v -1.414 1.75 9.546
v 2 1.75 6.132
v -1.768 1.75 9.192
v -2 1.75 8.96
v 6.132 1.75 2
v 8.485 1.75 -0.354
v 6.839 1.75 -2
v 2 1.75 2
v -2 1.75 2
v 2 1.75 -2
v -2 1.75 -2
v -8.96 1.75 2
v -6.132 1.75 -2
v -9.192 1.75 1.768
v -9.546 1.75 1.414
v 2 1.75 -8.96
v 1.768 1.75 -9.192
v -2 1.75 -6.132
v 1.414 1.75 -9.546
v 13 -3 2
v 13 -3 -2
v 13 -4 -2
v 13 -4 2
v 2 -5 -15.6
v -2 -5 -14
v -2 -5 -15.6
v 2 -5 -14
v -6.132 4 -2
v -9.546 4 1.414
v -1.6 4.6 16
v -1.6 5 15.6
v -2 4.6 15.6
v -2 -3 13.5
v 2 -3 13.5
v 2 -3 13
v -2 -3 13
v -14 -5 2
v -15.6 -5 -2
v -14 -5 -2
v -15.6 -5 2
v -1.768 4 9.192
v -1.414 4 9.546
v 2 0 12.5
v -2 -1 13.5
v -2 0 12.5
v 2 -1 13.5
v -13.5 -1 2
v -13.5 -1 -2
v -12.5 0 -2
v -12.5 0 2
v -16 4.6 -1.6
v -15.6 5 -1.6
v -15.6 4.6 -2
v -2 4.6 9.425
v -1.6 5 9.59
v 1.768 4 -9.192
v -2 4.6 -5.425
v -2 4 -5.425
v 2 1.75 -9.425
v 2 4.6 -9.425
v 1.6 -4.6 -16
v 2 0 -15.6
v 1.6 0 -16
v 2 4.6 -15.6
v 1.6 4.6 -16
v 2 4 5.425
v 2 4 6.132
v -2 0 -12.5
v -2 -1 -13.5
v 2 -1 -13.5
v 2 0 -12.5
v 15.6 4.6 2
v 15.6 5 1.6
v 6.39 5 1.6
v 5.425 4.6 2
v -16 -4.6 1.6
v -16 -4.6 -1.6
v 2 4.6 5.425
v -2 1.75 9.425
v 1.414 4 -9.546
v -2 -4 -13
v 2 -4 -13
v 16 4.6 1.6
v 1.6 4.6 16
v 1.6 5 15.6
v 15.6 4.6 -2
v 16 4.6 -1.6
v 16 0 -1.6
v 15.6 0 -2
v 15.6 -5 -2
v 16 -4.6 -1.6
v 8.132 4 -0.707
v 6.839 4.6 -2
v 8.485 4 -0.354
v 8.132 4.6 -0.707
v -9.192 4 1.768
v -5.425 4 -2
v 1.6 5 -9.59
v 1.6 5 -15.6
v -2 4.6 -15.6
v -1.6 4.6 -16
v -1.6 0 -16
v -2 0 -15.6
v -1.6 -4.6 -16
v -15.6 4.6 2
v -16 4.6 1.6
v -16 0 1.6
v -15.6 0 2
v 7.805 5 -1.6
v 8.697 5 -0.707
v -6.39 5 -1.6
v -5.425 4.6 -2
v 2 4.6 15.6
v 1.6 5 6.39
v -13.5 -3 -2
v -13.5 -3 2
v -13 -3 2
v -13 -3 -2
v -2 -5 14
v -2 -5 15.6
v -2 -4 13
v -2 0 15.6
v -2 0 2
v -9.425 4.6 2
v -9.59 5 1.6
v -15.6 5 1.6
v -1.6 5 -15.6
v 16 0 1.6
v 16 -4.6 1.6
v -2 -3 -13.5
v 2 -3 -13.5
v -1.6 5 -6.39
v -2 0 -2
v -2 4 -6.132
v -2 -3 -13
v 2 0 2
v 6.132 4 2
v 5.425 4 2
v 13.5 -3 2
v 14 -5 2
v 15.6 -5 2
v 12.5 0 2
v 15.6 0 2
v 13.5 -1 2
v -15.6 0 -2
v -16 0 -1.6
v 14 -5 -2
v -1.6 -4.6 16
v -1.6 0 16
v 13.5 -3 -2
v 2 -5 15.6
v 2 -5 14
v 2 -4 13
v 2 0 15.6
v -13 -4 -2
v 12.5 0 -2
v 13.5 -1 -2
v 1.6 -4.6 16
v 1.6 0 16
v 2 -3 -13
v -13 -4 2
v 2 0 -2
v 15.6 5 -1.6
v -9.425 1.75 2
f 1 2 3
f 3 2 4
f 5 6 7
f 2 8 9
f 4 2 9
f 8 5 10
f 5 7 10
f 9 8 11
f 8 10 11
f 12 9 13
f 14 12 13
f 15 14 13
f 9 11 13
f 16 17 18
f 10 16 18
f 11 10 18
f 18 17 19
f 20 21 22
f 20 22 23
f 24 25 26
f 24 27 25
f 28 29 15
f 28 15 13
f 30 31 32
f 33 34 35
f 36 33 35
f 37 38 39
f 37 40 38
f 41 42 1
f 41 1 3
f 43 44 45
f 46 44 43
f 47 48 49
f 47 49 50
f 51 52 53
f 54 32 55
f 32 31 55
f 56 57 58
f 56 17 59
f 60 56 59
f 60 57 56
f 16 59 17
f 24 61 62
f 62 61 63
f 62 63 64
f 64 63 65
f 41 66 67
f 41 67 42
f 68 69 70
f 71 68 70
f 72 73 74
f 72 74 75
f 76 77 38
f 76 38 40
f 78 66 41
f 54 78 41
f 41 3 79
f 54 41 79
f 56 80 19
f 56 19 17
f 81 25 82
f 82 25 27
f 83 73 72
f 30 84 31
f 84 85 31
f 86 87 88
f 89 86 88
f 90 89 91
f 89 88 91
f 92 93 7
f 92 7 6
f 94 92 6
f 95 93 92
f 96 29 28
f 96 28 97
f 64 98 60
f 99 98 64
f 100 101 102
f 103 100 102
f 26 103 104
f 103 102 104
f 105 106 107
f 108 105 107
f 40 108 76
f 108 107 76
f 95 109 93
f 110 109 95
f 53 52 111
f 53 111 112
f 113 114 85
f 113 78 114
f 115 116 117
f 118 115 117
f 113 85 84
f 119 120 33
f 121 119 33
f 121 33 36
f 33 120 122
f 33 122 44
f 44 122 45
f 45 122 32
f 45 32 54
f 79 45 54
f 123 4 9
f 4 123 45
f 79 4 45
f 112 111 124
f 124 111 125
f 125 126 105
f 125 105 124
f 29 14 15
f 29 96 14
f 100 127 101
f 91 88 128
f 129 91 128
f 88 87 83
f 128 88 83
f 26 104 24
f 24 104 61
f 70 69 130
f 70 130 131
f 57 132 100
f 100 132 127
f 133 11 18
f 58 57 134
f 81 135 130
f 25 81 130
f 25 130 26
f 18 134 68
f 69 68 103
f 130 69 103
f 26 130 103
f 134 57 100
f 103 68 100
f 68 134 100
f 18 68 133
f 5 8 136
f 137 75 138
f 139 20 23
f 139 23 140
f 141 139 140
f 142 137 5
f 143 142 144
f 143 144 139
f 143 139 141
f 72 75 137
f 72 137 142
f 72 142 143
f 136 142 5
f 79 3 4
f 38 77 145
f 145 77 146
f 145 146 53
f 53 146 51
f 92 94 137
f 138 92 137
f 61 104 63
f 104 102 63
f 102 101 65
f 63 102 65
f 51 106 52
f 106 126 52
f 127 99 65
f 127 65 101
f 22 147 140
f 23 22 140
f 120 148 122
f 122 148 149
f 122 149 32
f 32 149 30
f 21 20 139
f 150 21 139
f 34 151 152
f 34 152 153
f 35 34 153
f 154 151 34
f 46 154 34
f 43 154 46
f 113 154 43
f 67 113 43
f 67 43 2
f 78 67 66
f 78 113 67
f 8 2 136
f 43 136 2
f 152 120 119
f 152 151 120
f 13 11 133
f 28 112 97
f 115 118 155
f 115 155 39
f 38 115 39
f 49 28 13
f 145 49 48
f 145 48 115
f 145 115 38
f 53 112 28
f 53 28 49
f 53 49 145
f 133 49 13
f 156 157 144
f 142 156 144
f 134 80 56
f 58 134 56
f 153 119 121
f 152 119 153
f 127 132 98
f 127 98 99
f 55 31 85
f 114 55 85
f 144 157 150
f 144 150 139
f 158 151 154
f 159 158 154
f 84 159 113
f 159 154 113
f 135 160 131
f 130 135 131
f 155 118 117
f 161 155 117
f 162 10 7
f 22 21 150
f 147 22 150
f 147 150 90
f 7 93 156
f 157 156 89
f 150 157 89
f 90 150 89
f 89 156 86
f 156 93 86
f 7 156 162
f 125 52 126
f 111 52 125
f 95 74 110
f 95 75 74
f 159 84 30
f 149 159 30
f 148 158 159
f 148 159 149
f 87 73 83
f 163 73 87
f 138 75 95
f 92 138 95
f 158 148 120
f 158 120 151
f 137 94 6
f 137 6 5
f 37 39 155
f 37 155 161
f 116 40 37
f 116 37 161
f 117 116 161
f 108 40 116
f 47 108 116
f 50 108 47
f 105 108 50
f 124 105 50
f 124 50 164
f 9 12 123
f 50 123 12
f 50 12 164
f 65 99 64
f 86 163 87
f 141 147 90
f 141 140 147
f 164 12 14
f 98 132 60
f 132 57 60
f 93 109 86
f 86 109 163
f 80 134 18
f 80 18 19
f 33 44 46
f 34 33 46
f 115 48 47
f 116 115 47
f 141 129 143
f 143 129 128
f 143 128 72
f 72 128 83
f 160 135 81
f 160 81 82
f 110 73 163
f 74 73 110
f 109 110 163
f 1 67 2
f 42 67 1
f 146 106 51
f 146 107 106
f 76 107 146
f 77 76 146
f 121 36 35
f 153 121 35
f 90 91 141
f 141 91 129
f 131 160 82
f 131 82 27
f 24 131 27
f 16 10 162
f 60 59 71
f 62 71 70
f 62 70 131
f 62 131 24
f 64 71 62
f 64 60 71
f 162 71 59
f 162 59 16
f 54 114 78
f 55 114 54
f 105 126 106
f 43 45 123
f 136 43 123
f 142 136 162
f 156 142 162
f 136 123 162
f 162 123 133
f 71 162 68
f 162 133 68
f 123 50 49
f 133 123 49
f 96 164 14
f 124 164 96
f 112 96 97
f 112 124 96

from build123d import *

# Parameters (mm, degrees)
SKETCH1_W               = 31.999999976
SKETCH1_H               = 4
BOSS_EXTRUDE1_DEPTH     = 5
SKETCH2_W               = 2.499999921
SKETCH2_H               = 4
BOSS_EXTRUDE2_DEPTH     = 3
SKETCH3_W               = 2.999999921
SKETCH3_H               = 4
BOSS_EXTRUDE3_DEPTH     = 2
CIRPATTERN1_COUNT       = 2
CIRPATTERN1_ANGLE       = 90
CUT_EXTRUDE1_DEPTH      = 3.250000112
BOSS_EXTRUDE4_DEPTH     = 1
CUT_EXTRUDE_THIN1_START = -3.25
CUT_EXTRUDE_THIN1_DEPTH = 3.25
CUT_EXTRUDE_THIN2_START = -3.25
CUT_EXTRUDE_THIN2_DEPTH = 3.25
CHAMFER2_SIZE           = 1
CHAMFER3_SIZE           = 0.4


with BuildPart() as part:
    # Sketch1 → Boss-Extrude1 (new body)
    with BuildSketch(Plane(origin=(0, 0, 0), x_dir=(1, 0, 0), z_dir=(0, 1, 0))):
        Rectangle(SKETCH1_W, SKETCH1_H)
    extrude(amount=BOSS_EXTRUDE1_DEPTH)

    # Sketch2 → Boss-Extrude2 (add)
    with BuildSketch(Plane.XZ):
        with Locations((14.750000028, 0)):
            Rectangle(SKETCH2_W, SKETCH2_H)
        with Locations((-14.750000028, 0)):
            Rectangle(SKETCH2_W, SKETCH2_H)
    extrude(amount=BOSS_EXTRUDE2_DEPTH)

    # Sketch3 → Boss-Extrude3 (add)
    with BuildSketch(Plane.XZ.offset(3)):
        with Locations((14.500000028, 0)):
            Rectangle(SKETCH3_W, SKETCH3_H)
        with Locations((-14.500000028, 0)):
            Rectangle(SKETCH3_W, SKETCH3_H)
    extrude(amount=BOSS_EXTRUDE3_DEPTH)

    # CirPattern1: part ×2 about axis
    cirpattern1_axis = Axis((0, 0, 0), (0, 1, 0))


with BuildPart() as part_1:
    add(part.part)
    for i in range(1, CIRPATTERN1_COUNT):
        add(part.part.rotate(cirpattern1_axis, i * CIRPATTERN1_ANGLE / (CIRPATTERN1_COUNT - 1)))

    # Sketch6 → Cut-Extrude1 (cut)
    with BuildSketch(Plane(origin=(0, 5, 0), x_dir=(1, 0, 0), z_dir=(0, 1, 0))):
        Polygon((-1.414213562, -9.545941546), (-9.545941546, -1.414213562), (1.414213562, 9.545941546), (6.01040764, 4.949747468), (4.949747468, 3.889087297), (8.485281374, 0.353553391), align=None)
    extrude(amount=-CUT_EXTRUDE1_DEPTH, mode=Mode.SUBTRACT)

    # Sketch7 → Boss-Extrude4 (add)
    with BuildSketch(Plane(origin=(0, 5, 0), x_dir=(1, 0, 0), z_dir=(0, 1, 0))):
        Polygon((-9.545941546, -1.414213562), (-9.192388155, -1.767766953), (-5.424621202, 2), (-6.131727984, 2), align=None)
        Polygon((1.767766953, 9.192388155), (1.414213562, 9.545941546), (-2, 6.131727984), (-2, 5.424621202), align=None)
        Polygon((8.131727984, 0.707106781), (8.485281374, 0.353553391), (6.131727984, -2), (5.424621202, -2), align=None)
        Polygon((2, -5.424621202), (2, -6.131727984), (-1.414213562, -9.545941546), (-1.767766953, -9.192388155), align=None)
    extrude(amount=-BOSS_EXTRUDE4_DEPTH)

    # Sketch8 → Cut-Extrude-Thin1 (cut)
    with BuildSketch(Plane(origin=(0, 5, 0), x_dir=(1, 0, 0), z_dir=(0, 1, 0)).offset(CUT_EXTRUDE_THIN1_START)):
        Polygon((-9.424621202, -2), (2, 9.424621202), (3.796051224, 7.628569978), (-7.628569978, -3.796051224), align=None)
    extrude(amount=CUT_EXTRUDE_THIN1_DEPTH, mode=Mode.SUBTRACT)

    # Sketch9 → Cut-Extrude-Thin2 (cut)
    with BuildSketch(Plane(origin=(0, 5, 0), x_dir=(1, 0, 0), z_dir=(0, 1, 0)).offset(CUT_EXTRUDE_THIN2_START)):
        Polygon((2, -5.424621202), (-2, -9.424621202), (-3.796051224, -7.628569978), (0.203948776, -3.628569978), align=None)
    extrude(amount=CUT_EXTRUDE_THIN2_DEPTH, mode=Mode.SUBTRACT)

    # Chamfer2
    chamfer2_edges = [part_1.edges().sort_by_distance(p)[0] for p in [
        (0, 0, 13.500000067),
        (0, -5, -13.000000067),
        (0, -5, 13.000000067),
        (13.500000067, 0, 0),
        (-13.500000067, 0, 0),
        (13.000000067, -5, 0),
        (-13.000000067, -5, 0),
        (0, 0, -13.500000067),
    ]]
    chamfer(chamfer2_edges, length=CHAMFER2_SIZE)

    # Chamfer3
    chamfer3_edges = [part_1.edges().sort_by_distance(p)[0] for p in [
        (15.999999988, 5, 0),
        (0, -5, -15.999999988),
        (0, -5, 15.999999988),
        (11.419417376, 5, -2),
        (10.712310595, 5, 2),
        (-10.712310595, 5, -2),
        (-7.424621202, 5, 0),
        (0, 5, -7.424621202),
        (7.485281374, 5, -1.353553391),
        (6.778174593, 5, 0.646446609),
        (0, 5, 7.424621202),
        (2, 5, -12.712310595),
        (-2, 5, 12.712310595),
        (15.999999988, -5, 0),
        (-15.999999988, 5, 0),
        (-15.999999988, -5, 0),
        (-12.712310595, 5, 2),
        (0, 5, 15.999999988),
        (2, 5, 10.712310595),
        (0, 5, -15.999999988),
        (-2, 5, -10.712310595),
        (2, 0, 15.999999988),
        (-2, 0, -15.999999988),
        (-15.999999988, 0, -2),
        (-2, 0, 15.999999988),
        (2, 0, -15.999999988),
        (15.999999988, 0, -2),
        (15.999999988, 0, 2),
        (-15.999999988, 0, 2),
    ]]
    chamfer(chamfer3_edges, length=CHAMFER3_SIZE)


solid = part_1.part
